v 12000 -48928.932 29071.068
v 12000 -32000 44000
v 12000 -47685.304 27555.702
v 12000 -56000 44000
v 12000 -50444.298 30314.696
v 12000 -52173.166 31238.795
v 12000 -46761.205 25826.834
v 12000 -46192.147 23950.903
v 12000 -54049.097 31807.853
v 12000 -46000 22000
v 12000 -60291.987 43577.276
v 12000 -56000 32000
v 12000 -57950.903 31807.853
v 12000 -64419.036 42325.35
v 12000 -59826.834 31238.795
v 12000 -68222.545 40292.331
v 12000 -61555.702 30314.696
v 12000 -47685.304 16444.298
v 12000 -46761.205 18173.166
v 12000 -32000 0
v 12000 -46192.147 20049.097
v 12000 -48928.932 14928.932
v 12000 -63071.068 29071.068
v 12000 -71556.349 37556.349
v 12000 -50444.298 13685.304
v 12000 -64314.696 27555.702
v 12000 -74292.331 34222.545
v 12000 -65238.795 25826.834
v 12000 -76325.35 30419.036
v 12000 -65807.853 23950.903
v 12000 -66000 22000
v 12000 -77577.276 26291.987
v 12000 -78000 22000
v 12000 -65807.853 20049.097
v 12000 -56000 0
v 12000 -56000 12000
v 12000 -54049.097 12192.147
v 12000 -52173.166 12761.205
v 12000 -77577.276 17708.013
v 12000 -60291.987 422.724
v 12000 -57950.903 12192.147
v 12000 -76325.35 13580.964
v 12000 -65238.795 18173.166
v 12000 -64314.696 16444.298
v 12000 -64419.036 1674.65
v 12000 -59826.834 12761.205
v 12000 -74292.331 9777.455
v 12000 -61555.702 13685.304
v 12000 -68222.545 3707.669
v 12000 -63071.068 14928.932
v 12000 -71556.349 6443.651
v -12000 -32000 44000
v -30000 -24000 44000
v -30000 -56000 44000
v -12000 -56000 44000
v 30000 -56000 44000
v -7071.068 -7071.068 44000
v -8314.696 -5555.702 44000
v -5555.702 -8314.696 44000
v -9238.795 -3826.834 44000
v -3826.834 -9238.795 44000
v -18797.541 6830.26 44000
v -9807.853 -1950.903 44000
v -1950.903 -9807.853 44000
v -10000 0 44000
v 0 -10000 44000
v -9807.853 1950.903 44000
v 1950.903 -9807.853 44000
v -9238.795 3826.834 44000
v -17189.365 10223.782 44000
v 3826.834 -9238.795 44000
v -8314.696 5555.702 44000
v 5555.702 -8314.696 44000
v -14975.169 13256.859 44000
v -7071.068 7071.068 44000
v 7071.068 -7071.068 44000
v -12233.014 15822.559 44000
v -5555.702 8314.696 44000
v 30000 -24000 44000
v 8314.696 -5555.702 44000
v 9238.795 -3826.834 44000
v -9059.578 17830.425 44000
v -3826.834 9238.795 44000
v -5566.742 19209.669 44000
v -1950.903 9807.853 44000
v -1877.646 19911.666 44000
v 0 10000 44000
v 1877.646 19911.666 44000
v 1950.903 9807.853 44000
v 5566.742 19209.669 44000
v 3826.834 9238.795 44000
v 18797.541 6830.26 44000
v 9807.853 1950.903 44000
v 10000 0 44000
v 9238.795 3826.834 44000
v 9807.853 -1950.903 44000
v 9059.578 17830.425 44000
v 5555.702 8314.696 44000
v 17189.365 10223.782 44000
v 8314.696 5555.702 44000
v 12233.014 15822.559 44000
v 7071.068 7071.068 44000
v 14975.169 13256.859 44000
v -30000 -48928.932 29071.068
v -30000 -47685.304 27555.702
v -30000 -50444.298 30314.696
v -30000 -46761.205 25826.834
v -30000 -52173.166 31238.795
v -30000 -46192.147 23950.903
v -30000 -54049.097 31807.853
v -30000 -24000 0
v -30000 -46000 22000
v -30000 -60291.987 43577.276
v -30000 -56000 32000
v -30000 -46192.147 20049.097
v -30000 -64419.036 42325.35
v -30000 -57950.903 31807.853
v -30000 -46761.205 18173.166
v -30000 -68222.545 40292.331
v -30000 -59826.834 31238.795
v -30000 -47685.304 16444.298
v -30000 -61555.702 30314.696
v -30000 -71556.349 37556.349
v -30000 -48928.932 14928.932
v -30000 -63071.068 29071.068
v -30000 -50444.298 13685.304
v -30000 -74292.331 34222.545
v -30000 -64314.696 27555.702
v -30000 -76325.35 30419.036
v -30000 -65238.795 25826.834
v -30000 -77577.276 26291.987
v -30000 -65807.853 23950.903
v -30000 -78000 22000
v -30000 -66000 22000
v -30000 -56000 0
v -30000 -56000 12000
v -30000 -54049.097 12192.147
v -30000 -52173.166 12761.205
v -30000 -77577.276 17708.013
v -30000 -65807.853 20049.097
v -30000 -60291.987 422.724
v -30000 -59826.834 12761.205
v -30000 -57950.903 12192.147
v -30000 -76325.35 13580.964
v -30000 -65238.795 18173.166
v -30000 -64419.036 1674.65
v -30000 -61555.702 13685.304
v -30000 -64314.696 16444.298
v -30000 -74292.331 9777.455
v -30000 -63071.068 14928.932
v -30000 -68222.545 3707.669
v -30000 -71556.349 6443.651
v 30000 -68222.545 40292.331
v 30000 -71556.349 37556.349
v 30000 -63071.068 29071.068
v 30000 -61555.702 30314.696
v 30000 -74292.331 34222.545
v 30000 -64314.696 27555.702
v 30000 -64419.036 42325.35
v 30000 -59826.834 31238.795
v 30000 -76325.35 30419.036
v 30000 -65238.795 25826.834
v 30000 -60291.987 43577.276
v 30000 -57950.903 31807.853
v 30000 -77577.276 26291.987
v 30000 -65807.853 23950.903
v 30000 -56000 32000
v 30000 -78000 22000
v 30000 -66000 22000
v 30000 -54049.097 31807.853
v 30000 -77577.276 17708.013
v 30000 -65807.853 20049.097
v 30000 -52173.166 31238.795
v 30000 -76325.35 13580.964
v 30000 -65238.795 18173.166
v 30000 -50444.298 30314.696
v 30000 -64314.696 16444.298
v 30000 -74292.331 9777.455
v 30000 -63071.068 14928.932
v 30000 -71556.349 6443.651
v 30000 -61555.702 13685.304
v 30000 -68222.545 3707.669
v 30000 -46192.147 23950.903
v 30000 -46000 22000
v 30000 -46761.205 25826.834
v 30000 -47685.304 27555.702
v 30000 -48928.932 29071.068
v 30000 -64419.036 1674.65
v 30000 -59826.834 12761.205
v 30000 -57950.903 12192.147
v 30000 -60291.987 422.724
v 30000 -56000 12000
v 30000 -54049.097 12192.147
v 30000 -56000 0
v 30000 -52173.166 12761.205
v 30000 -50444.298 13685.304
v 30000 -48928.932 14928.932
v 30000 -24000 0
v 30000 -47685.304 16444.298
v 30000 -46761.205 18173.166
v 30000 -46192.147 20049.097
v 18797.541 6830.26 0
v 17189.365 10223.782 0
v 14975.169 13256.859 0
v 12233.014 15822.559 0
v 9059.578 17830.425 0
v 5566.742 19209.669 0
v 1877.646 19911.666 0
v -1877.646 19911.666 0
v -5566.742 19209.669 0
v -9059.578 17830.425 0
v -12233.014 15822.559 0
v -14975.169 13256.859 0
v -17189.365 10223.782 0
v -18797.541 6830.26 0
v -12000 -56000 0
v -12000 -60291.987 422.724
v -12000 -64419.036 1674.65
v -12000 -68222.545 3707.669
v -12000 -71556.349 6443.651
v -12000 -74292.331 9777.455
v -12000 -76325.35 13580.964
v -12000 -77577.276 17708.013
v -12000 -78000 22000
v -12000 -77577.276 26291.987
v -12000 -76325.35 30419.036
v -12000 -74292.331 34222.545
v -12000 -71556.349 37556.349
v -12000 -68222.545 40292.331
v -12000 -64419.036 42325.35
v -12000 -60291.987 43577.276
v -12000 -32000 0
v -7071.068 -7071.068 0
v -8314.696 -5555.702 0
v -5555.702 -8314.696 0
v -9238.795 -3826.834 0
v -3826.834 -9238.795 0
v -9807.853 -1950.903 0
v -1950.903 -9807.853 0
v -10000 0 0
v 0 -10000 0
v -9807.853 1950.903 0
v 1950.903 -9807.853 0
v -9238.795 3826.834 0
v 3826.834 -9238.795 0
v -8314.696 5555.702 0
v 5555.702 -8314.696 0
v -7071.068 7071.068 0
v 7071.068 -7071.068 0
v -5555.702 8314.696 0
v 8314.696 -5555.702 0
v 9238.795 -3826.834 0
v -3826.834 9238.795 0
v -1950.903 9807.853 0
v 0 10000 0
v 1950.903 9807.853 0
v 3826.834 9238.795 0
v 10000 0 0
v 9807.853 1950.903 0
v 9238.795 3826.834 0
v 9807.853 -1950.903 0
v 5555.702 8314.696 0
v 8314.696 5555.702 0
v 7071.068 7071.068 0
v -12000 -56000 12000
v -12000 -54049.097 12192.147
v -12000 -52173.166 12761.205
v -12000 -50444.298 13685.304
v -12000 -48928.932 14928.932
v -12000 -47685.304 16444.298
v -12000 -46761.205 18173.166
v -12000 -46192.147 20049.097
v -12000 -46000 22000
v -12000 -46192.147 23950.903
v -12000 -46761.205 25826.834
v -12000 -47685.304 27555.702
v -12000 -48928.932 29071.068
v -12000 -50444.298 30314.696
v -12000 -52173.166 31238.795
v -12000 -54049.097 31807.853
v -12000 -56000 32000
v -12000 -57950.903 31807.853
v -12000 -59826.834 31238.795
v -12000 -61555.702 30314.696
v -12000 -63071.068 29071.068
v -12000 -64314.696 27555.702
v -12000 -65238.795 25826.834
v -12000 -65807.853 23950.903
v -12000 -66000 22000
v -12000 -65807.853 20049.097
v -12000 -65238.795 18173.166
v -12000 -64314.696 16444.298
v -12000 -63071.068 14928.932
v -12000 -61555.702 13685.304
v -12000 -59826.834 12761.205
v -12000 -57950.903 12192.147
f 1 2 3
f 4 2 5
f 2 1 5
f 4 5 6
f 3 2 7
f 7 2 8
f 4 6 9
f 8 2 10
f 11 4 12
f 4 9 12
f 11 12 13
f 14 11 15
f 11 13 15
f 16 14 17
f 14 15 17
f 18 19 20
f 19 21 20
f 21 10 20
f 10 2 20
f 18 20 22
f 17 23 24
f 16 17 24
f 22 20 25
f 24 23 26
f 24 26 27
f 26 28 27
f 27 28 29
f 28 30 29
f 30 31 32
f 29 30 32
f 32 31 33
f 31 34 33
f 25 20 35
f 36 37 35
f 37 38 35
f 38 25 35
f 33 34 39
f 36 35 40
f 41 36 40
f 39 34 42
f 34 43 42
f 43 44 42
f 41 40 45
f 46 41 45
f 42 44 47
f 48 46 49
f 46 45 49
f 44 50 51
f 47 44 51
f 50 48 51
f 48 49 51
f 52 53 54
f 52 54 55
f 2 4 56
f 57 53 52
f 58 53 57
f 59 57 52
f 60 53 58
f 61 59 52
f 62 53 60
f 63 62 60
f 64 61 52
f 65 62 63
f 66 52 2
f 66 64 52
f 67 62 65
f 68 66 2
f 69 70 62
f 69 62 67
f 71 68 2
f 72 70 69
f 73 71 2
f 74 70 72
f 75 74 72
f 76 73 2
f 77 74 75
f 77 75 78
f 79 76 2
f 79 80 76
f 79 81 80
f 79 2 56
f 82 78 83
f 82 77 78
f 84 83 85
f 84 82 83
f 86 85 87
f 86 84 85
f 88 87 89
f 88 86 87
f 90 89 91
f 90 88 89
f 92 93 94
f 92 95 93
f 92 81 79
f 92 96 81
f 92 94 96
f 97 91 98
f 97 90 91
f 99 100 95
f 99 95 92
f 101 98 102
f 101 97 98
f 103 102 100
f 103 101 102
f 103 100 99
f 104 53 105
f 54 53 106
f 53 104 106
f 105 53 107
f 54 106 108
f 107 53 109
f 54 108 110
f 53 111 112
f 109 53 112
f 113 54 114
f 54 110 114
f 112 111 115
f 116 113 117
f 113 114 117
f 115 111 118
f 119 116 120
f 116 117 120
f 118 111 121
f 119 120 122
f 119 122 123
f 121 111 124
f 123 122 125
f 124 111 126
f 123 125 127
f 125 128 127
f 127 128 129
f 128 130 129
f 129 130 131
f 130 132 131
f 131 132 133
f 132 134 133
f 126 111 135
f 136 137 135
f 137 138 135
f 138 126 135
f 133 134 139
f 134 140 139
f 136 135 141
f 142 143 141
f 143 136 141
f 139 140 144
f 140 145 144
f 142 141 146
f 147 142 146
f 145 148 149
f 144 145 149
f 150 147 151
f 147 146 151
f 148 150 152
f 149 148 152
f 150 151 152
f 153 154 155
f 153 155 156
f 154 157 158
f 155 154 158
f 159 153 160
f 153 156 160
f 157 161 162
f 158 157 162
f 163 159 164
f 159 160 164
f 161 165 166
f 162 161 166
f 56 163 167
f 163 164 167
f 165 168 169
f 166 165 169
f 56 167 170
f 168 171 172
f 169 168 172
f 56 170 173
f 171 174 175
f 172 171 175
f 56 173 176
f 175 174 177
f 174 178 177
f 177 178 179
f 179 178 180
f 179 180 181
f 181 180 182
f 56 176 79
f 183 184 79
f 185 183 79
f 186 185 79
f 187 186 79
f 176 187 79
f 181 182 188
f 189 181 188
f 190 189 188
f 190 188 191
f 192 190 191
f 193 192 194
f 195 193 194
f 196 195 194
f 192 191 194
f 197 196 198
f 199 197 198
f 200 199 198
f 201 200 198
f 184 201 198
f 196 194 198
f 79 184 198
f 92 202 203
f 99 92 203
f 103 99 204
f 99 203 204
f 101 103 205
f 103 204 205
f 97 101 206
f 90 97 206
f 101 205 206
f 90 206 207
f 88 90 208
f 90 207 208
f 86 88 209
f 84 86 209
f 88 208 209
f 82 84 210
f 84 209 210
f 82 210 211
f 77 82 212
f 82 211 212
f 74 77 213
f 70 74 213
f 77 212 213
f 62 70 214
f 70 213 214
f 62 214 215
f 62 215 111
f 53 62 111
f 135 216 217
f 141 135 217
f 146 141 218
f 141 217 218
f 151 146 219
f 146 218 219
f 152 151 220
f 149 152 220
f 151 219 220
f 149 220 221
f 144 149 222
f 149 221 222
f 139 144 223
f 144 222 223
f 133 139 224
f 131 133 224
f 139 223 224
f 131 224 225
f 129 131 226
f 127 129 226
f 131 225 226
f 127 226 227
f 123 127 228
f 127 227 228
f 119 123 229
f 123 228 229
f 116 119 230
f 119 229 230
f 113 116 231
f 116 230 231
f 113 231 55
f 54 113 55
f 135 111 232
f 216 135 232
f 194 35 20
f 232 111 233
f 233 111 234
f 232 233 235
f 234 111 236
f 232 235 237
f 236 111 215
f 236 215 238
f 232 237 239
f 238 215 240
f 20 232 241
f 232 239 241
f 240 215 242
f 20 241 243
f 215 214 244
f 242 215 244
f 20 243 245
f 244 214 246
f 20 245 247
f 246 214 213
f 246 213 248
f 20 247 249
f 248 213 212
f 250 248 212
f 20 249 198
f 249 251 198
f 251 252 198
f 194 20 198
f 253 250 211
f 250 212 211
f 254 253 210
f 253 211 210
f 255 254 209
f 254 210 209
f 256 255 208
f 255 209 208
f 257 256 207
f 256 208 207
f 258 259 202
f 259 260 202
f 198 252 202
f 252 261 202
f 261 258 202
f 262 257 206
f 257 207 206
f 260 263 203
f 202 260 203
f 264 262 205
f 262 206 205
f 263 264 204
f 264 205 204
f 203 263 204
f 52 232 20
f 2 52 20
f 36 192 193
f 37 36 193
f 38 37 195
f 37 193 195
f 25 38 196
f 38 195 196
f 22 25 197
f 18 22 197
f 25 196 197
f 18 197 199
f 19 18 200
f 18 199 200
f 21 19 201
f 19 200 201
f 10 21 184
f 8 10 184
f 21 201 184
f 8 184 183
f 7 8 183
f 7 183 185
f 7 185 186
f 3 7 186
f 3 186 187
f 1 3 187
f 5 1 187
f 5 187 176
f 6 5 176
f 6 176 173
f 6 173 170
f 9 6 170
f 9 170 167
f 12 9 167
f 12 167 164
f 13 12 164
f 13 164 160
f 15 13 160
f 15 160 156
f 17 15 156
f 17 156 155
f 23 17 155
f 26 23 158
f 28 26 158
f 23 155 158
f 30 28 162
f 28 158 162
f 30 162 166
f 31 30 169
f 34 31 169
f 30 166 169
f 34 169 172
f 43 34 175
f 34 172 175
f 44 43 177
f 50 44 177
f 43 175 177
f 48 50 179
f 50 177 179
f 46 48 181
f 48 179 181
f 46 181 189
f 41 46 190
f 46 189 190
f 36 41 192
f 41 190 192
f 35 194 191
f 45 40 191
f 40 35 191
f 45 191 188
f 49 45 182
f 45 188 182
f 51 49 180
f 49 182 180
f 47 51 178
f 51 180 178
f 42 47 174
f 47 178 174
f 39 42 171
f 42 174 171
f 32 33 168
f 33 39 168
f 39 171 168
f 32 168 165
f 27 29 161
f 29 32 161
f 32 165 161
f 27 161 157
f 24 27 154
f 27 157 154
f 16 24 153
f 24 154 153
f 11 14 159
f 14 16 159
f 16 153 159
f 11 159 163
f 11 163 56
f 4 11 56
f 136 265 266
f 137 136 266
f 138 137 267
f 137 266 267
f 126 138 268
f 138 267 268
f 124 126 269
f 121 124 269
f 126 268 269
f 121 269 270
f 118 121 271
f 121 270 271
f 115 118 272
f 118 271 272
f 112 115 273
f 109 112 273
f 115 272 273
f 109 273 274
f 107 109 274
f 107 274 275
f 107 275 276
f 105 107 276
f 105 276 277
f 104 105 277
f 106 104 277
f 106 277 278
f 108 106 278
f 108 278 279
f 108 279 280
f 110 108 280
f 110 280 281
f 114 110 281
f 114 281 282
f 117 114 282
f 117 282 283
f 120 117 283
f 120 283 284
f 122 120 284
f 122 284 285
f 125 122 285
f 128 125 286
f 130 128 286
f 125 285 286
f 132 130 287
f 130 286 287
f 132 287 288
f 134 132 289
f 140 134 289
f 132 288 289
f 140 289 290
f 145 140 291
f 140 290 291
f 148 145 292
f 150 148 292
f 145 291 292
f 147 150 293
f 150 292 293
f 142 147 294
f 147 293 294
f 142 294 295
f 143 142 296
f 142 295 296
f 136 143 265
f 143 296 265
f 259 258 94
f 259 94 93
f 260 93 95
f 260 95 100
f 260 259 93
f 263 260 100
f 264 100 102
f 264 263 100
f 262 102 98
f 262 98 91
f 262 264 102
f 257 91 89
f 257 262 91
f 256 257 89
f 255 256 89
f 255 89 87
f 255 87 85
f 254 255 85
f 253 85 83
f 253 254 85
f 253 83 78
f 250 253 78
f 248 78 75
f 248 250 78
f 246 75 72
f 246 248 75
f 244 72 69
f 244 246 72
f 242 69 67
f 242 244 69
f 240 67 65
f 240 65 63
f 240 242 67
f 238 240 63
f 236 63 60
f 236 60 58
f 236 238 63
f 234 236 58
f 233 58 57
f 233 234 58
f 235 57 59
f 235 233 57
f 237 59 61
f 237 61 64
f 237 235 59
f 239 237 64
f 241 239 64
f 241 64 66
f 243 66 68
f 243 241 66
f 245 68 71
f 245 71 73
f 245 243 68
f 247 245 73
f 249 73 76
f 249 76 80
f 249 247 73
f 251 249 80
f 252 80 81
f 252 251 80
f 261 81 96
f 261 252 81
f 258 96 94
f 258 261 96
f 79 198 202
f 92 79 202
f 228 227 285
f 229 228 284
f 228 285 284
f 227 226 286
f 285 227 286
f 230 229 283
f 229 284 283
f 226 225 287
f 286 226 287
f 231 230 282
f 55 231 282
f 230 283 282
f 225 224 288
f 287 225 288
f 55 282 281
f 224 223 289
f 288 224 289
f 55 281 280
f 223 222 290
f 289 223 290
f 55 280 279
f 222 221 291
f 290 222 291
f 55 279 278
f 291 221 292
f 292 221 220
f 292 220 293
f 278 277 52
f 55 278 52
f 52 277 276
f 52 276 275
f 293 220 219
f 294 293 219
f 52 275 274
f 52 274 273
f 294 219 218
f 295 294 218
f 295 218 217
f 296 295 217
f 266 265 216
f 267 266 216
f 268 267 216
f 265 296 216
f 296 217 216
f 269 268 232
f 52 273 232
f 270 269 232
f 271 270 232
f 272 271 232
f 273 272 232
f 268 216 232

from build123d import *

# Parameters (mm, degrees)
SKETCH1_R           = 10000
BOSS_EXTRUDE3_DEPTH = 44000
SKETCH2_R           = 10000
CUT_EXTRUDE1_DEPTH  = 107797.103825695
CUT_EXTRUDE2_DEPTH  = 107797.103825695


with BuildPart() as part:
    # Sketch1 → Boss-Extrude3 (new body)
    with BuildSketch(Plane.XY):
        with BuildLine():
            Line((-30000, -24000), (-30000, -78000))
            Line((-30000, -78000), (-12000, -78000))
            Line((-12000, -78000), (-12000, -32000))
            Line((-12000, -32000), (12000, -32000))
            Line((12000, -32000), (12000, -78000))
            Line((12000, -78000), (30000, -78000))
            Line((30000, -78000), (30000, -24000))
            Line((30000, -24000), (18797.541116655, 6830.259729152))
            ThreePointArc((18797.541116655, 6830.259729152), (0, 20000), (-18797.541116655, 6830.259729152))
            Line((-18797.541116655, 6830.259729152), (-30000, -24000))
        make_face()
        Circle(SKETCH1_R, mode=Mode.SUBTRACT)
    extrude(amount=BOSS_EXTRUDE3_DEPTH)

    # Sketch2 → Cut-Extrude1 (cut, through all)
    with BuildSketch(Plane(origin=(30000, 0, 0), x_dir=(0, 0, -1), z_dir=(1, 0, 0))):
        with Locations((-22000, -56000)):
            Circle(SKETCH2_R)
    extrude(amount=-CUT_EXTRUDE1_DEPTH, mode=Mode.SUBTRACT)

    # Sketch3 → Cut-Extrude2 (cut, through all)
    with BuildSketch(Plane(origin=(30000, 0, 0), x_dir=(0, 0, -1), z_dir=(1, 0, 0))):
        with BuildLine():
            Line((-44000, -78000), (-22000, -78000))
            ThreePointArc((-22000, -78000), (-37556.349186104, -71556.349186104), (-44000, -56000))
            Line((-44000, -56000), (-44000, -78000))
        make_face()
        with BuildLine():
            Line((-22000, -78000), (0, -78000))
            Line((0, -78000), (0, -56000))
            ThreePointArc((0, -56000), (-6443.650813896, -71556.349186104), (-22000, -78000))
        make_face()
    extrude(amount=-CUT_EXTRUDE2_DEPTH, mode=Mode.SUBTRACT)


solid = part.part
